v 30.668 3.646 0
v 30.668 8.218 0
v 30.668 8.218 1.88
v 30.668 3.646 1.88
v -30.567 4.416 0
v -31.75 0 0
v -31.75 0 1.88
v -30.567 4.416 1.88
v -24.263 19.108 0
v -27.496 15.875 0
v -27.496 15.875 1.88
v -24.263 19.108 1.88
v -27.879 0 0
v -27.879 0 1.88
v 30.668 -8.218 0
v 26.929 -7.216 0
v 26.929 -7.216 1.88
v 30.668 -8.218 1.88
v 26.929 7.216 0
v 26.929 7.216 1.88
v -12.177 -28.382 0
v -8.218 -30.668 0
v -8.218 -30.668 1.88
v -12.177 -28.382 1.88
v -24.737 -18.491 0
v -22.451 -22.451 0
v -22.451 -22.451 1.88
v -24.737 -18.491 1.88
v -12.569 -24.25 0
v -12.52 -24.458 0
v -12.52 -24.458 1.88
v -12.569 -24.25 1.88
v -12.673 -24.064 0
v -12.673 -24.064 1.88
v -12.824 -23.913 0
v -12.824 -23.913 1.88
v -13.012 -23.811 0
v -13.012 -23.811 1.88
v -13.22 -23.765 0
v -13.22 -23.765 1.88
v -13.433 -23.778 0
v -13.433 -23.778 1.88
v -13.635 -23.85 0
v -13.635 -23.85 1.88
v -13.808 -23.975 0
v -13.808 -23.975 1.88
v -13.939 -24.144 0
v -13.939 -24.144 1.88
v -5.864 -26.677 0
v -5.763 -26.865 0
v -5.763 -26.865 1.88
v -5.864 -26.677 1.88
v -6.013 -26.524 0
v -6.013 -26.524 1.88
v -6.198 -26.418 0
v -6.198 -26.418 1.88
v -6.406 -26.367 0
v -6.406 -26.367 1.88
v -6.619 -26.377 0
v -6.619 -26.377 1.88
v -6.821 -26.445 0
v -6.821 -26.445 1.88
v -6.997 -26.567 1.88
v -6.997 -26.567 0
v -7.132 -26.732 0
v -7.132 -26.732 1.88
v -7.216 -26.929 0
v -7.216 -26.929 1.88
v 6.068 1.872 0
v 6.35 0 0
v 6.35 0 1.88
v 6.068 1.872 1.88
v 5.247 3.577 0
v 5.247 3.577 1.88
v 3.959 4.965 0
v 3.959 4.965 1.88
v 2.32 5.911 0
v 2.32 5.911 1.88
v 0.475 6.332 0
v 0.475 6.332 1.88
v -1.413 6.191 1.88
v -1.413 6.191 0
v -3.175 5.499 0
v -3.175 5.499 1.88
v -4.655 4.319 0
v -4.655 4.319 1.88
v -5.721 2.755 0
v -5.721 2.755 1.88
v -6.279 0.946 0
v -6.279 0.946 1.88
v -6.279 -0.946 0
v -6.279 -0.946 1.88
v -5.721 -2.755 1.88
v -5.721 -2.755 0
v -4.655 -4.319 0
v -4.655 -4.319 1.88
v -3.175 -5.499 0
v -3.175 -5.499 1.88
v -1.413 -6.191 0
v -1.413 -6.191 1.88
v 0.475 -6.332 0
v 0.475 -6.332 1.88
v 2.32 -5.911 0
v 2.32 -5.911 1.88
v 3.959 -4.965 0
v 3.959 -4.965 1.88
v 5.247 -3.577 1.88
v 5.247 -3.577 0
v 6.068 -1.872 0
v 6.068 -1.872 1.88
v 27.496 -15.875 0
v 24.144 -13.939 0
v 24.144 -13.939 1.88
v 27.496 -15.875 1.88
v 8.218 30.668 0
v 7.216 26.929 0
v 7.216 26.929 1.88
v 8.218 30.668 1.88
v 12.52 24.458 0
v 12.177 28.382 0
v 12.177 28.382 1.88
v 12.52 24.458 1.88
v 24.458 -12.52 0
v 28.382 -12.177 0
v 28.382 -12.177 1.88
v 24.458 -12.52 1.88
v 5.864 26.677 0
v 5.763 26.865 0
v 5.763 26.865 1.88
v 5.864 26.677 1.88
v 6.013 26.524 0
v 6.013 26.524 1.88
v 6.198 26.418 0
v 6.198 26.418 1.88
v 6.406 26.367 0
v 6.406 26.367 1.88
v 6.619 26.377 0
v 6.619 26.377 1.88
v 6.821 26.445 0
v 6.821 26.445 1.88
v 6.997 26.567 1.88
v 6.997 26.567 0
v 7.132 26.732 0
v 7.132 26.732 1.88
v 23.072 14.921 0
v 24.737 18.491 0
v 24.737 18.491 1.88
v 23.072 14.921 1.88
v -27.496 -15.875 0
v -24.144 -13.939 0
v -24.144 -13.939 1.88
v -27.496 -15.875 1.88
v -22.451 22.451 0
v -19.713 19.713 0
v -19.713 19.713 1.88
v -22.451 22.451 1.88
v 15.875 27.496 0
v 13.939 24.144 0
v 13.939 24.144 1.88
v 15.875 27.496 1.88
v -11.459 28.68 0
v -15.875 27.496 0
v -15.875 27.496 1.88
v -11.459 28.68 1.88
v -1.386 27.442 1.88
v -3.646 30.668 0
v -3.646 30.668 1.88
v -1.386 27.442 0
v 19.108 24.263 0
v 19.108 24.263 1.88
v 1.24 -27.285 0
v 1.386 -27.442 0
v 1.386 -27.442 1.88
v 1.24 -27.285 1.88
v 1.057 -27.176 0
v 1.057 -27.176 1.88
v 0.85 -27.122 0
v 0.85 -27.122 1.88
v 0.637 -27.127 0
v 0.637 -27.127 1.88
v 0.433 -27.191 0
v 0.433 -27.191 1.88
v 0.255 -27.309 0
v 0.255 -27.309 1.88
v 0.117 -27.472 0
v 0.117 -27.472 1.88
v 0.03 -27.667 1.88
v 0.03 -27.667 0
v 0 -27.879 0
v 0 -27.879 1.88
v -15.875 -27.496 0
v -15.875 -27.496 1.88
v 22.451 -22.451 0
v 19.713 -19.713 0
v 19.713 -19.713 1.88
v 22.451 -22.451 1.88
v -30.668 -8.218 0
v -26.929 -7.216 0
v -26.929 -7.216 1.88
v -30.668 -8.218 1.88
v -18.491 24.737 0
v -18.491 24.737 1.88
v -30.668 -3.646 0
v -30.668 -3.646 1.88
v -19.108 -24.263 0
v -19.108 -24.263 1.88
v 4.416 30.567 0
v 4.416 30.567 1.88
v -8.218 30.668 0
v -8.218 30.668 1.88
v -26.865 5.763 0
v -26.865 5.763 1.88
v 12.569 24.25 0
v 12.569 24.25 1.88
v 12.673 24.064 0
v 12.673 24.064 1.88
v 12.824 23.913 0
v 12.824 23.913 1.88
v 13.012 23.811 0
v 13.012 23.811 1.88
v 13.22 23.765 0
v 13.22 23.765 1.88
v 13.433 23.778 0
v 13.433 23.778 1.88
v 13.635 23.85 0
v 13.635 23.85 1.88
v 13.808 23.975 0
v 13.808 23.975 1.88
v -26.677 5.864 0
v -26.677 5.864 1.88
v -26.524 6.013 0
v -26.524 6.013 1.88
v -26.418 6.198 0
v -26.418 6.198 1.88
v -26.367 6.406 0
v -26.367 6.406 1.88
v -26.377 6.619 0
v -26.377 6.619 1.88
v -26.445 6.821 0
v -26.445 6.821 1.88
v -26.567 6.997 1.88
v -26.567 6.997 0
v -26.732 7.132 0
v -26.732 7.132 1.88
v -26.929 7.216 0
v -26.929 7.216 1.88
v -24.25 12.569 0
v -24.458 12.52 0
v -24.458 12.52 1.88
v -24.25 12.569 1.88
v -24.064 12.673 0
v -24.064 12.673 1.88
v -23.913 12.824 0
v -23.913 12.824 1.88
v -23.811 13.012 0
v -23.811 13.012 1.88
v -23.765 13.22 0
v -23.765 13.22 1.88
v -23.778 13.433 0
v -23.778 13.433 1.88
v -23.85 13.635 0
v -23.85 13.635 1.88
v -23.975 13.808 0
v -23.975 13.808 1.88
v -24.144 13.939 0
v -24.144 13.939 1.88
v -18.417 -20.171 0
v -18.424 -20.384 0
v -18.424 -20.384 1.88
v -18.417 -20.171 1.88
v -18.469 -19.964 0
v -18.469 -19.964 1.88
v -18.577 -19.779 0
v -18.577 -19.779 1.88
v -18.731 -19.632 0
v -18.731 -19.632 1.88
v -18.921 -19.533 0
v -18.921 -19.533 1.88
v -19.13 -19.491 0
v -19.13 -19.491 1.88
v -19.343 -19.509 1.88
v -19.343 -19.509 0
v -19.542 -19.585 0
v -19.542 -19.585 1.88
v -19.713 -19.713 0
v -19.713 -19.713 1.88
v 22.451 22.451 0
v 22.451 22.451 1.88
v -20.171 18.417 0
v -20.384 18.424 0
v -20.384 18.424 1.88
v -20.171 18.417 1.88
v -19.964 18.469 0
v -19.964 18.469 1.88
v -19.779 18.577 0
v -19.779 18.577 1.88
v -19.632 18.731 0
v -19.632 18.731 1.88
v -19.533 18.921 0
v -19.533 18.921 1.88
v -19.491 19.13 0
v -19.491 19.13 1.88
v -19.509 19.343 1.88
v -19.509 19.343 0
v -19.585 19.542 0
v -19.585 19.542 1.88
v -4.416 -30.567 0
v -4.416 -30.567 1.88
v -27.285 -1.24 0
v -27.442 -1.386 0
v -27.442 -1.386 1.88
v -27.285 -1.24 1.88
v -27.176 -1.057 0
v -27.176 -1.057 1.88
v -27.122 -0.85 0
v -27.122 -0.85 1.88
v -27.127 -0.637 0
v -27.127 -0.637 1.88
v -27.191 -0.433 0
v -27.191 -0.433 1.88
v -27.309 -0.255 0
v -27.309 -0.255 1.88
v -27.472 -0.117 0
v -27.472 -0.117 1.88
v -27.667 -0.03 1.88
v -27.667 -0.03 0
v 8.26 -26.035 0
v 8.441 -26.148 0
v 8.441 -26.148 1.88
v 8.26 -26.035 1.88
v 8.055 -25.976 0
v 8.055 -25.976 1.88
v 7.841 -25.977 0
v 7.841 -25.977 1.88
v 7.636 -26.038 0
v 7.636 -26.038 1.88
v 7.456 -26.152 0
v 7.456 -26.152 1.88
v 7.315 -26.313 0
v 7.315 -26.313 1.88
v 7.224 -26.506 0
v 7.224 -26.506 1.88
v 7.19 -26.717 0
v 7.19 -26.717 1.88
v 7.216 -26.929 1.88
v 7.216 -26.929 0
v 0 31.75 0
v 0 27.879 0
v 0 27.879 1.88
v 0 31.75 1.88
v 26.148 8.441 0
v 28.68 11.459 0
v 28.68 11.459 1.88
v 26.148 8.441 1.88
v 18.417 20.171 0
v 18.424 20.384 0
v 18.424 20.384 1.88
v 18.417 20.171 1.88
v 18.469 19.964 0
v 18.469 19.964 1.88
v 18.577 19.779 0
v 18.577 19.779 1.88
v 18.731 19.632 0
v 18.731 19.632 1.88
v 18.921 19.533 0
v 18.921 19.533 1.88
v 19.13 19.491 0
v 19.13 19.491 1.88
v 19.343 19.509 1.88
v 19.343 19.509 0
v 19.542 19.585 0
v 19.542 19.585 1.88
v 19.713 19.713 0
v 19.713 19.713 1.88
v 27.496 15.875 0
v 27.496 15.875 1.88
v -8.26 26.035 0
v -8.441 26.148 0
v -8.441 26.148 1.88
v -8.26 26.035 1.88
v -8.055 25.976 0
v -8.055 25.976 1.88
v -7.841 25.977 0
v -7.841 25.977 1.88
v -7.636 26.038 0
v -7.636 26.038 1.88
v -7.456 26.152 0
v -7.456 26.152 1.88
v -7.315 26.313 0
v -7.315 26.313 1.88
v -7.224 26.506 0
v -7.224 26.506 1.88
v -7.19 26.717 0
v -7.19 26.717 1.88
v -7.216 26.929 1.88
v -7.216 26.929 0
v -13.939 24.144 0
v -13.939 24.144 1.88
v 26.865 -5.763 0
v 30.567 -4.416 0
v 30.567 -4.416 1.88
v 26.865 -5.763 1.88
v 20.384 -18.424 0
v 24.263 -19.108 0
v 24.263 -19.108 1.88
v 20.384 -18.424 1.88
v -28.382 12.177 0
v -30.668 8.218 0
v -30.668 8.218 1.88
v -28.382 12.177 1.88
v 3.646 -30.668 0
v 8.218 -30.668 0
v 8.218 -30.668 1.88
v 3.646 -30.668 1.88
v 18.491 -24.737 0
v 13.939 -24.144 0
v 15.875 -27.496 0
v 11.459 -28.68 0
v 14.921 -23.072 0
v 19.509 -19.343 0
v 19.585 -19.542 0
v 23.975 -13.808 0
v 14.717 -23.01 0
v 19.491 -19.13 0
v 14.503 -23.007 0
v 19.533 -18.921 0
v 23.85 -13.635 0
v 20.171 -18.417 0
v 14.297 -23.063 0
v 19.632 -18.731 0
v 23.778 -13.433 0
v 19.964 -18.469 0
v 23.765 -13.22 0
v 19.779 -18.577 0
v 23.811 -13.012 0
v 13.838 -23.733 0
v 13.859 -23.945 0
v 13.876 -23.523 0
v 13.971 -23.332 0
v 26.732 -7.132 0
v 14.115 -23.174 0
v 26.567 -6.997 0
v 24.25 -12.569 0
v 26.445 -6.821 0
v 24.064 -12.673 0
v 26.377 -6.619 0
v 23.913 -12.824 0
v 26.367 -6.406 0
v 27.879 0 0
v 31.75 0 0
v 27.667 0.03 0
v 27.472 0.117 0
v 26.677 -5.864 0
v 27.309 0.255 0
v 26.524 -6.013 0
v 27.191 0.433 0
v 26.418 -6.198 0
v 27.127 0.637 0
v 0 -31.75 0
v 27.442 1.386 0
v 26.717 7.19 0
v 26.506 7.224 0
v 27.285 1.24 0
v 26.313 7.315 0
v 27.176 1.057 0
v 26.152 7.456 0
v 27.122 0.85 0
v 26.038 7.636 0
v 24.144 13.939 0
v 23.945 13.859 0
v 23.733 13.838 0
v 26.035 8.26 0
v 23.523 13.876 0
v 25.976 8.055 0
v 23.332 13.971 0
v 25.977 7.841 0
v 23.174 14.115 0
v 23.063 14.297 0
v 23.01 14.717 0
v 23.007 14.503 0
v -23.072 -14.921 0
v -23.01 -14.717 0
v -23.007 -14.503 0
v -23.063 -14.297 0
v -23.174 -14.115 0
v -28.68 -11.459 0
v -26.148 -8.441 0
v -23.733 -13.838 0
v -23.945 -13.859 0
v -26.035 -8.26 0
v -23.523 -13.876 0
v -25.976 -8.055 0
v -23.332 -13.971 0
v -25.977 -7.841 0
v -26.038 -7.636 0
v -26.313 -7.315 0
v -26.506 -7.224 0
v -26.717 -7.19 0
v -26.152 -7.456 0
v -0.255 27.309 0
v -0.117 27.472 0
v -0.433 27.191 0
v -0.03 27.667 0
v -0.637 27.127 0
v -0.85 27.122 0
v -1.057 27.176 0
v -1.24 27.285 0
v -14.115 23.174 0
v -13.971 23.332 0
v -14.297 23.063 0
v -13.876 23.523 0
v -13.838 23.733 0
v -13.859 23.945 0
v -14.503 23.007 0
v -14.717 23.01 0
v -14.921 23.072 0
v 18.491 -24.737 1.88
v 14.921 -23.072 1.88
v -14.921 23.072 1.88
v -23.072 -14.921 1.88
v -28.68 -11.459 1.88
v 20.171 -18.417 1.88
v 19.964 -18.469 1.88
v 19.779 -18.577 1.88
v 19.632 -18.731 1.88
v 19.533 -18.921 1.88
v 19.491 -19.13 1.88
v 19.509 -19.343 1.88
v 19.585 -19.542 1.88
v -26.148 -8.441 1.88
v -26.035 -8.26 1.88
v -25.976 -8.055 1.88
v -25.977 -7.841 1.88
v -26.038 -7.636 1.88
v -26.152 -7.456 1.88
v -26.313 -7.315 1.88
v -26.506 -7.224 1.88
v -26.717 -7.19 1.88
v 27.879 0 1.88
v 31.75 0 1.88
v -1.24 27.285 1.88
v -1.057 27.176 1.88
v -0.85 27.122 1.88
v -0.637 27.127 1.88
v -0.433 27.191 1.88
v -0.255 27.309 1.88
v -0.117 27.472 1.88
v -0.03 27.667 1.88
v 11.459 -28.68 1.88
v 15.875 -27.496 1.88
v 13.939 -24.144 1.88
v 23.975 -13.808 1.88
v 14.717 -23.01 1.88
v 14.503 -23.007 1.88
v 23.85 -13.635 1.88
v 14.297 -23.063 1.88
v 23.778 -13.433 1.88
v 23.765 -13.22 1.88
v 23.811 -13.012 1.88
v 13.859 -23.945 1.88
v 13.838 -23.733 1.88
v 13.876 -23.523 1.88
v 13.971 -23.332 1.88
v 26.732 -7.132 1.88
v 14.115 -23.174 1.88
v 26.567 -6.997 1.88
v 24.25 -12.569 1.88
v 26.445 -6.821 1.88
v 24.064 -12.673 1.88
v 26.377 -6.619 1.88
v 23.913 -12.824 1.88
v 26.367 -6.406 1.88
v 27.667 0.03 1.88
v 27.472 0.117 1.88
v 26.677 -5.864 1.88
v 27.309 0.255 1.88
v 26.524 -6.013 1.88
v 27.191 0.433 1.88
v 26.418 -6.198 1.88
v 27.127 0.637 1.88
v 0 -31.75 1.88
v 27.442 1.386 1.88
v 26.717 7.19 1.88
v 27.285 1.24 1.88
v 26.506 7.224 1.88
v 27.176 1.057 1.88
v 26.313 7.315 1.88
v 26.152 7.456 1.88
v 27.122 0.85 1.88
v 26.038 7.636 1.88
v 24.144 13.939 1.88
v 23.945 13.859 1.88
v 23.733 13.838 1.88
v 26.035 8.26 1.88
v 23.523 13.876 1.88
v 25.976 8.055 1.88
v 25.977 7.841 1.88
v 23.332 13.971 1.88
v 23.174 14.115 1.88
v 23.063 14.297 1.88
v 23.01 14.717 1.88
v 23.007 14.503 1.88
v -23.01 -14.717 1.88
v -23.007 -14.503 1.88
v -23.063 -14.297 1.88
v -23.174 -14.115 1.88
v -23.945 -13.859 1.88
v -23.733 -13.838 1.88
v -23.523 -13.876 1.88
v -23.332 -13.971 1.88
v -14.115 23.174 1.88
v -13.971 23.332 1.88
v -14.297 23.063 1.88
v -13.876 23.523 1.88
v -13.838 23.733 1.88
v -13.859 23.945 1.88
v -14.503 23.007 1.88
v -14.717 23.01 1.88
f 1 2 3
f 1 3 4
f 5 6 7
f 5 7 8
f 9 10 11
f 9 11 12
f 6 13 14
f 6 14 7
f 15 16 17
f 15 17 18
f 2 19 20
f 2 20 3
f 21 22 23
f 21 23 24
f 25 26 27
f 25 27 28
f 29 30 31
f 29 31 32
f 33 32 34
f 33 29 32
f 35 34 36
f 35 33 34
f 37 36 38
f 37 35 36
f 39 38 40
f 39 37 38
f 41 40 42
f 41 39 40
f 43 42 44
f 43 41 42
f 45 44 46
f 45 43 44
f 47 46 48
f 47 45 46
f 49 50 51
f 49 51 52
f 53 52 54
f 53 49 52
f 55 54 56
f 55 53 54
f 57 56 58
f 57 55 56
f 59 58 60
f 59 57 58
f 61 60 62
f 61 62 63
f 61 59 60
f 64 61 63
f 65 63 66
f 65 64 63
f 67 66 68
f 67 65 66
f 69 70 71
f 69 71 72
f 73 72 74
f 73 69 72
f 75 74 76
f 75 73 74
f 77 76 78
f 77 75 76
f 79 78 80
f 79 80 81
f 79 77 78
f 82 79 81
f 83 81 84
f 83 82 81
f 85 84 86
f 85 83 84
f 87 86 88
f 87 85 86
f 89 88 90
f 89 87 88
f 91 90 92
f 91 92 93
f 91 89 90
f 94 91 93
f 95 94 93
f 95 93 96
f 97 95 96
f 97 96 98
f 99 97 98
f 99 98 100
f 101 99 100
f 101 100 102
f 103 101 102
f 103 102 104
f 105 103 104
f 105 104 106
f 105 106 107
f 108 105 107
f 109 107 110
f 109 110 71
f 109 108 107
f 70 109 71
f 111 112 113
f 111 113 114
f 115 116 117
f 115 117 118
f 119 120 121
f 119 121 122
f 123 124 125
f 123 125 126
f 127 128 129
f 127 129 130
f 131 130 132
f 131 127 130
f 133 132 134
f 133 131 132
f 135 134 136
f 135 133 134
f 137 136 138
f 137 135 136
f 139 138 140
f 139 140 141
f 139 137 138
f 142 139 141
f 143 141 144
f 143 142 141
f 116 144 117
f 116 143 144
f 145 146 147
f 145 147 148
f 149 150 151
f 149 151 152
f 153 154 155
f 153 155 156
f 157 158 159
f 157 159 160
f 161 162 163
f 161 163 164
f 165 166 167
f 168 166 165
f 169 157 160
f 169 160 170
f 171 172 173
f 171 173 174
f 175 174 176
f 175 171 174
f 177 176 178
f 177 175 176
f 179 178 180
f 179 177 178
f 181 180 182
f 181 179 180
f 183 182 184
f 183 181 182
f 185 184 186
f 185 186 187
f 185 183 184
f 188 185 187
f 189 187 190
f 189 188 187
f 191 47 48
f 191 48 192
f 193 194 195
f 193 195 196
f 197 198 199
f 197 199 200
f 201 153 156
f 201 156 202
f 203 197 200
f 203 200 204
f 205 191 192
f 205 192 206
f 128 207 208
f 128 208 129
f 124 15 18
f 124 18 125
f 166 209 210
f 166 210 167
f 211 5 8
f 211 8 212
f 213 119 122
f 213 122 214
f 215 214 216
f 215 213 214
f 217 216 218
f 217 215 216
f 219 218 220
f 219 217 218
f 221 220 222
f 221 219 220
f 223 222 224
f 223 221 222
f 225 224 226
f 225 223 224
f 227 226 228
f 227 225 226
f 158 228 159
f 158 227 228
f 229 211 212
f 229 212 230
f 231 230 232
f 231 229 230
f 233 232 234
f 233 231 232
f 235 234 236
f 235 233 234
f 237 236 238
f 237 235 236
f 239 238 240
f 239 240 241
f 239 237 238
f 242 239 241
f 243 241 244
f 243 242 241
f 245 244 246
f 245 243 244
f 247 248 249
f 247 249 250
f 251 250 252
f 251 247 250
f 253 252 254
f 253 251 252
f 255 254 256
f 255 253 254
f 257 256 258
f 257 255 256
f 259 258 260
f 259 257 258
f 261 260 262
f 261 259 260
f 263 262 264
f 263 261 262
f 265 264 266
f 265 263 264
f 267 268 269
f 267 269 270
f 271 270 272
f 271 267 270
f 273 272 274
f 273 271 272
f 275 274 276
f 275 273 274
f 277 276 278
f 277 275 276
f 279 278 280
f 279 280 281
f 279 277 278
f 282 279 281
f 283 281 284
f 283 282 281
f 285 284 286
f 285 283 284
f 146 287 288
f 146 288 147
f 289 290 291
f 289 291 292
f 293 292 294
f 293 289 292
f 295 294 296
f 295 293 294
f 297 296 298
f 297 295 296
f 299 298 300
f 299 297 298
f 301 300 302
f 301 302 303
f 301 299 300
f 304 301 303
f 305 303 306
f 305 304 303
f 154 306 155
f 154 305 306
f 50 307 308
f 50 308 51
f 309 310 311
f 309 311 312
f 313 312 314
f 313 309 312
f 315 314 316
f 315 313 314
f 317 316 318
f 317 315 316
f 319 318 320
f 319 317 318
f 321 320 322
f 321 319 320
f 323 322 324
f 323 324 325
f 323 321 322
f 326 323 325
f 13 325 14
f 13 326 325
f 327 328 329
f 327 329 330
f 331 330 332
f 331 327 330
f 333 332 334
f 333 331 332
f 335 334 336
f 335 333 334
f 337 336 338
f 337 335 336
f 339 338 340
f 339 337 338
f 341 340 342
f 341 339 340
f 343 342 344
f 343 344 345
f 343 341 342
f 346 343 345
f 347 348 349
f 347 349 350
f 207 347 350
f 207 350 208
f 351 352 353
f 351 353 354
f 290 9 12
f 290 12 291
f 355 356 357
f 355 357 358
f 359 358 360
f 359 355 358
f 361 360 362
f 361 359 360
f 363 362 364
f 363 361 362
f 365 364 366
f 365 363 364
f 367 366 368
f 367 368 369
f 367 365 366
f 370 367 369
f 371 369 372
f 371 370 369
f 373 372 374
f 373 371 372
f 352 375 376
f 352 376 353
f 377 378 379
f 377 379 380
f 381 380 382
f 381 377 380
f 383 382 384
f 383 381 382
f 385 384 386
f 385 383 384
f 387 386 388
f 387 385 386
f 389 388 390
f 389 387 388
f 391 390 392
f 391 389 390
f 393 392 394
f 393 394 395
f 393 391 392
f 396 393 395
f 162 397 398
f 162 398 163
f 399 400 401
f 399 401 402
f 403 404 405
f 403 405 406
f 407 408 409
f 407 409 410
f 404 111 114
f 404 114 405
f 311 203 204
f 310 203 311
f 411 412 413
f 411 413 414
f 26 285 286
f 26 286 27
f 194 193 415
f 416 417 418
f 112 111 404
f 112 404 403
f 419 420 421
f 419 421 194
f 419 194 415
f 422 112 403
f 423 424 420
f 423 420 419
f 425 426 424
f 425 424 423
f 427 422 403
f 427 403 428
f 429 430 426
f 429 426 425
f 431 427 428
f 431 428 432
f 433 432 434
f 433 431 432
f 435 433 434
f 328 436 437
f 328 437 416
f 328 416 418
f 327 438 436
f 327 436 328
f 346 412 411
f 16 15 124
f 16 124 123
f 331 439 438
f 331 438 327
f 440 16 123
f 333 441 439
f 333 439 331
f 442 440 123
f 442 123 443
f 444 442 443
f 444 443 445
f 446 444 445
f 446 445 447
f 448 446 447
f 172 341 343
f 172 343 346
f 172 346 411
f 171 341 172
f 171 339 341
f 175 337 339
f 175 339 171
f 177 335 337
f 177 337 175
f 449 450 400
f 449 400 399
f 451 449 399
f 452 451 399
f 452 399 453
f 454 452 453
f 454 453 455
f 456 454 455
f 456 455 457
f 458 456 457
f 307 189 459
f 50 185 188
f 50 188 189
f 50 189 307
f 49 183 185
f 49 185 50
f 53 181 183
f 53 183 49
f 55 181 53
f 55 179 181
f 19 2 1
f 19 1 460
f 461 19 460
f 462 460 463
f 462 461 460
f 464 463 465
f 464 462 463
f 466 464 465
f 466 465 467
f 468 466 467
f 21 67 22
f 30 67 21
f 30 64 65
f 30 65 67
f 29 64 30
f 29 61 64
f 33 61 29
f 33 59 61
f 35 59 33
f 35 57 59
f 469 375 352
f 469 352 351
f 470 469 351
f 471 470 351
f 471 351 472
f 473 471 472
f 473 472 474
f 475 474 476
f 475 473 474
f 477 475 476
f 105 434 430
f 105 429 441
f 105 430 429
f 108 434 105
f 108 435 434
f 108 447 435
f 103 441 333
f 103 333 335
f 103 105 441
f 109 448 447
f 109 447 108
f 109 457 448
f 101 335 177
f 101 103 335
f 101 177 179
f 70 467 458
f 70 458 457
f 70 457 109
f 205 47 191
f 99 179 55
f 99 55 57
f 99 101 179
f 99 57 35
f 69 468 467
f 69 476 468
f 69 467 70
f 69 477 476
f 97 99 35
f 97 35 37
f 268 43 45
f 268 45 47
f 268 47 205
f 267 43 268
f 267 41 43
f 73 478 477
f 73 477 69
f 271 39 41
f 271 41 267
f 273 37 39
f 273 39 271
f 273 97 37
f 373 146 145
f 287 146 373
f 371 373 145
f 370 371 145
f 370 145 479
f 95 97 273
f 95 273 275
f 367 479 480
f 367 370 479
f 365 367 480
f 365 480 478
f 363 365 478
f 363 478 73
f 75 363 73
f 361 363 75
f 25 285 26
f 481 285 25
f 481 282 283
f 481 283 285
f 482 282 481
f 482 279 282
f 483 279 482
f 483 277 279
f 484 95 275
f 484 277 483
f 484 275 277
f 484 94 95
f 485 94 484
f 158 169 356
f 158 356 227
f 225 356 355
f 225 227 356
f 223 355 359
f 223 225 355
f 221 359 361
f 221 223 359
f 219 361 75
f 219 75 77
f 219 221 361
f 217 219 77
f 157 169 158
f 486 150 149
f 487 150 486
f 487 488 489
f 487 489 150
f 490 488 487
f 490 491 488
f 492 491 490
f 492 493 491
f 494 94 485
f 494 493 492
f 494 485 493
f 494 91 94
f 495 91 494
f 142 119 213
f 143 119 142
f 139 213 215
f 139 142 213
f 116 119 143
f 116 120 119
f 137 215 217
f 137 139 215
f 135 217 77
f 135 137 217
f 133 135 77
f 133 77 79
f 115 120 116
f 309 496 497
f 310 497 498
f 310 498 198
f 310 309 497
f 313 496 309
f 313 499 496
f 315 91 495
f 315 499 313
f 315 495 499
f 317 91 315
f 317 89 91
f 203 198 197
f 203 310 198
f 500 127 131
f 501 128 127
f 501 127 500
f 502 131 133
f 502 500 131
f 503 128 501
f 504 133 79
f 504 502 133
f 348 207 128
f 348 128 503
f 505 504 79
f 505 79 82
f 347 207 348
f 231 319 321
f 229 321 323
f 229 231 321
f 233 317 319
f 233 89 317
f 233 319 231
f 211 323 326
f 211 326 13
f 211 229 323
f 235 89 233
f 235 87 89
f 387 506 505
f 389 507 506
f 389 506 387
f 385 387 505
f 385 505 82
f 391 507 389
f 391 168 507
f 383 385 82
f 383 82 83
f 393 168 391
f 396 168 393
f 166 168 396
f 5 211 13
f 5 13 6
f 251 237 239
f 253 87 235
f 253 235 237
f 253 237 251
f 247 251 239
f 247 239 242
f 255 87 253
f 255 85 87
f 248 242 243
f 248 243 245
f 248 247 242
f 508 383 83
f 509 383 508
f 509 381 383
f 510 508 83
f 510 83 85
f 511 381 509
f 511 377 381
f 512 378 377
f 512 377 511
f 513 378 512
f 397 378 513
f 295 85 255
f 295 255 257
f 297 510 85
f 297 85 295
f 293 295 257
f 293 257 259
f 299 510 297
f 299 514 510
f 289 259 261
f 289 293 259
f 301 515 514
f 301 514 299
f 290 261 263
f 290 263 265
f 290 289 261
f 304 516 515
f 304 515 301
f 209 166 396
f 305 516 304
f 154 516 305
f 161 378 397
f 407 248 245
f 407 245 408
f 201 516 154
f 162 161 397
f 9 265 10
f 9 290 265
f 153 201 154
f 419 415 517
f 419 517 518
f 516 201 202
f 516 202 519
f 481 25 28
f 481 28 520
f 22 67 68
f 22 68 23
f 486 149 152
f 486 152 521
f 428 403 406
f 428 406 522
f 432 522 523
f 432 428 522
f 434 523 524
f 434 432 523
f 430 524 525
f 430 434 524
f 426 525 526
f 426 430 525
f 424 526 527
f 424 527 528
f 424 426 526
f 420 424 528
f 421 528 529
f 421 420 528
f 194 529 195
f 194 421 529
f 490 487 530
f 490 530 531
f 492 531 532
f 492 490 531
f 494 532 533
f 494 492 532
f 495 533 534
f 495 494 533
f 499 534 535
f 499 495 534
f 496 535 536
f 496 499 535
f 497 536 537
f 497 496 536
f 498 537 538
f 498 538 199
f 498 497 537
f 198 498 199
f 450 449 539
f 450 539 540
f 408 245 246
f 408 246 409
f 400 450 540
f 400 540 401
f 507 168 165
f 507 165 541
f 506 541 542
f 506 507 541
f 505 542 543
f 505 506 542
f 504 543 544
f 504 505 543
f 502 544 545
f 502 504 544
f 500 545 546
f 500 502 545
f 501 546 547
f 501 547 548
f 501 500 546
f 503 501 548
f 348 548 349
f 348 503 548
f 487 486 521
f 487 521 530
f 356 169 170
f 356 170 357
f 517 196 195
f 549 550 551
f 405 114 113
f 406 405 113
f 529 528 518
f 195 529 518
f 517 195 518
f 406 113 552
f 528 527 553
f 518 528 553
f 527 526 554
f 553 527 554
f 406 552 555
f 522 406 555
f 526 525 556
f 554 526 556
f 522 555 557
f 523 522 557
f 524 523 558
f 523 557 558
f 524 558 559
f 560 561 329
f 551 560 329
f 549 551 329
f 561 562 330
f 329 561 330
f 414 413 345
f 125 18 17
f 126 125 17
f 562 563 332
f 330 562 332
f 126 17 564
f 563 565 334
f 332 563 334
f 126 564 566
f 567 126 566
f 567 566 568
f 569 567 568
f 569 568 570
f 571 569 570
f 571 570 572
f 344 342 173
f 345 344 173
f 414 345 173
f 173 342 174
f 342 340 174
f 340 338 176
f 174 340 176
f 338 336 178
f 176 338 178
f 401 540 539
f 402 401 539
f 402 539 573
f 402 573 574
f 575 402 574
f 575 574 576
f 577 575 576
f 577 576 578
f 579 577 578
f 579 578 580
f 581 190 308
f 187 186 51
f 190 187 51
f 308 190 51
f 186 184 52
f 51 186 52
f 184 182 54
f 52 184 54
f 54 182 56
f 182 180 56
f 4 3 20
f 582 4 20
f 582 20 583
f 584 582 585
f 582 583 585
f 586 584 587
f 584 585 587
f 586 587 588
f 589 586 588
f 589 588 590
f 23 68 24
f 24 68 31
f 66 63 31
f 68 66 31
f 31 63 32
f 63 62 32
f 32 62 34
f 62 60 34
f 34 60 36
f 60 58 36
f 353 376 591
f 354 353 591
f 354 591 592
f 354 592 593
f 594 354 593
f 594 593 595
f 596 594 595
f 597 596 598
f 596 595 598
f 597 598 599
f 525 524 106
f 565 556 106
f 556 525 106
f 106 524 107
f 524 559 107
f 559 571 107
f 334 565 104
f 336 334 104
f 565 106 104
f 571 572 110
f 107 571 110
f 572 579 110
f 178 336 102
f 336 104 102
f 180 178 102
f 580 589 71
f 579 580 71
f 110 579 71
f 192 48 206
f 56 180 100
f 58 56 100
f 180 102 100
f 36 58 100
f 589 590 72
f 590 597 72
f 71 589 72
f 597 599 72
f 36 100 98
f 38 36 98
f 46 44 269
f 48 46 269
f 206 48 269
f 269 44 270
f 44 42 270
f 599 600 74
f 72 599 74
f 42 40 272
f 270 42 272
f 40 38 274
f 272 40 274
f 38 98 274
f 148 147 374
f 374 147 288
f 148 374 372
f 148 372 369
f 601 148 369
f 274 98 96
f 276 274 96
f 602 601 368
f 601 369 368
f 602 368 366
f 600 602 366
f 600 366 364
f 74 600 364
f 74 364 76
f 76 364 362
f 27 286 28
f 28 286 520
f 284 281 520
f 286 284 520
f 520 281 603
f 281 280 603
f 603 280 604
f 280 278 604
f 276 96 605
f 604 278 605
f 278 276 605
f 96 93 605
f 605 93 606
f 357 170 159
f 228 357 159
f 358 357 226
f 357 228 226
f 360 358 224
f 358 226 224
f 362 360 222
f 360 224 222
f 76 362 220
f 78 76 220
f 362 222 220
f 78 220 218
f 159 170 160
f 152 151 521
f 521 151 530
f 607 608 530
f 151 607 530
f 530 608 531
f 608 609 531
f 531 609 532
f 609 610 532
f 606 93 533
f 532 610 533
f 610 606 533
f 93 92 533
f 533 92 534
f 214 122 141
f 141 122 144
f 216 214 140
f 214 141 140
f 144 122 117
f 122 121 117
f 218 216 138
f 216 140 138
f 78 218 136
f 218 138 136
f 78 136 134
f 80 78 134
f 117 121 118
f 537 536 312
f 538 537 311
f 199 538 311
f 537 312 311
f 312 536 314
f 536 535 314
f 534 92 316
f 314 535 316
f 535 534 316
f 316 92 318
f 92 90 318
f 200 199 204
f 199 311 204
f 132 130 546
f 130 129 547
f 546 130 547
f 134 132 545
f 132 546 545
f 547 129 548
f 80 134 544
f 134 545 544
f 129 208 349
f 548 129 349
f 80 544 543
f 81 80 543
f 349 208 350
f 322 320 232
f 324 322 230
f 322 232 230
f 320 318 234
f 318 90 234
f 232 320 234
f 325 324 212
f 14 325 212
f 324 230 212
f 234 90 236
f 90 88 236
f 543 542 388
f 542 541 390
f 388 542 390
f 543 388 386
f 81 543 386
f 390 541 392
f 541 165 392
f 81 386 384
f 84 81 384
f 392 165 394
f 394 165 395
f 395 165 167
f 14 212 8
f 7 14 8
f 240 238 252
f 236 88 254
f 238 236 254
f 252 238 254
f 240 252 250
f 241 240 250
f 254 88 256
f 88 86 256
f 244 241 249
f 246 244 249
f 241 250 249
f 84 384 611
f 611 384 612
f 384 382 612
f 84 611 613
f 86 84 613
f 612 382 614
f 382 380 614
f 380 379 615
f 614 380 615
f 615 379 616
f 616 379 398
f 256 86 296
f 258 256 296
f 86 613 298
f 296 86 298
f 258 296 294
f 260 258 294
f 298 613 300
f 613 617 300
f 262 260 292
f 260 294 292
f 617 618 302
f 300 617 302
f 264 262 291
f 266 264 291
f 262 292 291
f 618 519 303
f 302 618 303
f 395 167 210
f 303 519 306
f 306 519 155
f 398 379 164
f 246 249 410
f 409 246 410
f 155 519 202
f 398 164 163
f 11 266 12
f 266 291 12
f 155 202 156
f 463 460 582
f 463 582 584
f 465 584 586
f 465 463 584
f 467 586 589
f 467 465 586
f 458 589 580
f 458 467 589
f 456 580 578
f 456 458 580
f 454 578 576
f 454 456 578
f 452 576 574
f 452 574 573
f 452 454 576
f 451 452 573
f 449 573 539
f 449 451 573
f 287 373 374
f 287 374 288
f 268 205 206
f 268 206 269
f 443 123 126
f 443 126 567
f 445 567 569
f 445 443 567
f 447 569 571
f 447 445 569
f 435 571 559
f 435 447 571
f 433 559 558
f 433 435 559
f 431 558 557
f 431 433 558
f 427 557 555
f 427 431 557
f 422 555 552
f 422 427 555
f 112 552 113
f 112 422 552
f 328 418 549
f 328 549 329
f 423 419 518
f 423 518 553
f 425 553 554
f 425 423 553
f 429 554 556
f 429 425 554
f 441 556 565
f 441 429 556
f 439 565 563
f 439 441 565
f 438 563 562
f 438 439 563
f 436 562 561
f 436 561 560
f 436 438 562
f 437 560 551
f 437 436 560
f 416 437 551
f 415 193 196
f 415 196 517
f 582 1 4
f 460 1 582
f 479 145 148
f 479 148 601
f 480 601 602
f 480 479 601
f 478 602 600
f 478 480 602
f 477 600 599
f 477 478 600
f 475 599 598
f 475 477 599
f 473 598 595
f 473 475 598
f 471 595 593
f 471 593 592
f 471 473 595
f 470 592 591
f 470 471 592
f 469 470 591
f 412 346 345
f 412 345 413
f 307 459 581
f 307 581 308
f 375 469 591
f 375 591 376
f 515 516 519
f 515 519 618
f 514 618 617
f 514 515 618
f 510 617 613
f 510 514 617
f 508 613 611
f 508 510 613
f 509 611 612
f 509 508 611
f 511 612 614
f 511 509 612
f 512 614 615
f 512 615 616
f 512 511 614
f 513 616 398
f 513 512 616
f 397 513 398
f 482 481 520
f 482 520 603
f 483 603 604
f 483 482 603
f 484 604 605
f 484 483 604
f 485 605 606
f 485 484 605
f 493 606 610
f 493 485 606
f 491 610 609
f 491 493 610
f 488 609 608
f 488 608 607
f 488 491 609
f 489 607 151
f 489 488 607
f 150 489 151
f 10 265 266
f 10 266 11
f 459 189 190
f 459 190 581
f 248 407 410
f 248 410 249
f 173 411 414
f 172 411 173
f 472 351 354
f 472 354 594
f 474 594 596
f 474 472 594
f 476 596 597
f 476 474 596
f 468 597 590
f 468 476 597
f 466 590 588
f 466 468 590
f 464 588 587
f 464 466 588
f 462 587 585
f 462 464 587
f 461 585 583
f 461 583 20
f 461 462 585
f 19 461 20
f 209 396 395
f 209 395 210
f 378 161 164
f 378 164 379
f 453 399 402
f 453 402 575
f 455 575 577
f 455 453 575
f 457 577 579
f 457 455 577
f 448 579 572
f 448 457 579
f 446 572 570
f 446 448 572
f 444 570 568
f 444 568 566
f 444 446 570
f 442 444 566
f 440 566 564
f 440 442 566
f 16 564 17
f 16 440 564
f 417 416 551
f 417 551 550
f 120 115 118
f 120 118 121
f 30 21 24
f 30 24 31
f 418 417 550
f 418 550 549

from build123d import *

# Parameters (mm, degrees)
SKETCH1_R           = 6.35
BOSS_EXTRUDE1_DEPTH = 1.8796


with BuildPart() as part:
    # Sketch1 → Boss-Extrude1 (new body)
    with BuildSketch(Plane.XY):
        with BuildLine():
            Line((0, 31.75), (4.416212878, 30.566679326))
            Line((4.416212878, 30.566679326), (5.763426192, 26.865241165))
            ThreePointArc((5.763426192, 26.865241165), (6.512709942, 26.364585769), (7.215507449, 26.928640402))
            Line((7.215507449, 26.928640402), (8.217504682, 30.668144985))
            Line((8.217504682, 30.668144985), (12.176972828, 28.382144985))
            Line((12.176972828, 28.382144985), (12.520278272, 24.458145807))
            ThreePointArc((12.520278272, 24.458145807), (13.114451646, 23.780620926), (13.939289989, 24.143558483))
            Line((13.939289989, 24.143558483), (15.875, 27.49630657))
            Line((15.875, 27.49630657), (19.107892204, 24.263414367))
            Line((19.107892204, 24.263414367), (18.423894078, 20.384268232))
            ThreePointArc((18.423894078, 20.384268232), (18.822465142, 19.576046065), (19.713132953, 19.713132953))
            Line((19.713132953, 19.713132953), (22.450640303, 22.450640303))
            Line((22.450640303, 22.450640303), (24.736640303, 18.491172157))
            Line((24.736640303, 18.491172157), (23.071951949, 14.921236463))
            ThreePointArc((23.071951949, 14.921236463), (23.247758745, 14.037396016), (24.143558483, 13.939289989))
            Line((24.143558483, 13.939289989), (27.49630657, 15.875))
            Line((27.49630657, 15.875), (28.679627244, 11.458787122))
            Line((28.679627244, 11.458787122), (26.147694424, 8.441347087))
            ThreePointArc((26.147694424, 8.441347087), (26.088756008, 7.542120627), (26.928640402, 7.215507449))
            Line((26.928640402, 7.215507449), (30.668144985, 8.217504682))
            Line((30.668144985, 8.217504682), (30.668144985, 3.645504682))
            Line((30.668144985, 3.645504682), (27.441514734, 1.386193858))
            ThreePointArc((27.441514734, 1.386193858), (27.151847662, 0.532862181), (27.878579979, 0))
            Line((27.878579979, 0), (31.75, 0))
            Line((31.75, 0), (30.566679326, -4.416212878))
            Line((30.566679326, -4.416212878), (26.865241165, -5.763426192))
            ThreePointArc((26.865241165, -5.763426192), (26.364585769, -6.512709942), (26.928640402, -7.215507449))
            Line((26.928640402, -7.215507449), (30.668144985, -8.217504682))
            Line((30.668144985, -8.217504682), (28.382144985, -12.176972828))
            Line((28.382144985, -12.176972828), (24.458145807, -12.520278272))
            ThreePointArc((24.458145807, -12.520278272), (23.780620926, -13.114451646), (24.143558483, -13.939289989))
            Line((24.143558483, -13.939289989), (27.49630657, -15.875))
            Line((27.49630657, -15.875), (24.263414367, -19.107892204))
            Line((24.263414367, -19.107892204), (20.384268232, -18.423894078))
            ThreePointArc((20.384268232, -18.423894078), (19.576046065, -18.822465142), (19.713132953, -19.713132953))
            Line((19.713132953, -19.713132953), (22.450640303, -22.450640303))
            Line((22.450640303, -22.450640303), (18.491172157, -24.736640303))
            Line((18.491172157, -24.736640303), (14.921236463, -23.071951949))
            ThreePointArc((14.921236463, -23.071951949), (14.037396016, -23.247758745), (13.939289989, -24.143558483))
            Line((13.939289989, -24.143558483), (15.875, -27.49630657))
            Line((15.875, -27.49630657), (11.458787122, -28.679627244))
            Line((11.458787122, -28.679627244), (8.441347087, -26.147694424))
            ThreePointArc((8.441347087, -26.147694424), (7.542120627, -26.088756008), (7.215507449, -26.928640402))
            Line((7.215507449, -26.928640402), (8.217504682, -30.668144985))
            Line((8.217504682, -30.668144985), (3.645504682, -30.668144985))
            Line((3.645504682, -30.668144985), (1.386193858, -27.441514734))
            ThreePointArc((1.386193858, -27.441514734), (0.532862181, -27.151847662), (0, -27.878579979))
            Line((0, -27.878579979), (0, -31.75))
            Line((0, -31.75), (-4.416212878, -30.566679326))
            Line((-4.416212878, -30.566679326), (-5.763426192, -26.865241165))
            ThreePointArc((-5.763426192, -26.865241165), (-6.512709942, -26.364585769), (-7.215507449, -26.928640402))
            Line((-7.215507449, -26.928640402), (-8.217504682, -30.668144985))
            Line((-8.217504682, -30.668144985), (-12.176972828, -28.382144985))
            Line((-12.176972828, -28.382144985), (-12.520278272, -24.458145807))
            ThreePointArc((-12.520278272, -24.458145807), (-13.114451646, -23.780620926), (-13.939289989, -24.143558483))
            Line((-13.939289989, -24.143558483), (-15.875, -27.49630657))
            Line((-15.875, -27.49630657), (-19.107892204, -24.263414367))
            Line((-19.107892204, -24.263414367), (-18.423894078, -20.384268232))
            ThreePointArc((-18.423894078, -20.384268232), (-18.822465142, -19.576046065), (-19.713132953, -19.713132953))
            Line((-19.713132953, -19.713132953), (-22.450640303, -22.450640303))
            Line((-22.450640303, -22.450640303), (-24.736640303, -18.491172157))
            Line((-24.736640303, -18.491172157), (-23.071951949, -14.921236463))
            ThreePointArc((-23.071951949, -14.921236463), (-23.247758745, -14.037396016), (-24.143558483, -13.939289989))
            Line((-24.143558483, -13.939289989), (-27.49630657, -15.875))
            Line((-27.49630657, -15.875), (-28.679627244, -11.458787122))
            Line((-28.679627244, -11.458787122), (-26.147694424, -8.441347087))
            ThreePointArc((-26.147694424, -8.441347087), (-26.088756008, -7.542120627), (-26.928640402, -7.215507449))
            Line((-26.928640402, -7.215507449), (-30.668144985, -8.217504682))
            Line((-30.668144985, -8.217504682), (-30.668144985, -3.645504682))
            Line((-30.668144985, -3.645504682), (-27.441514734, -1.386193858))
            ThreePointArc((-27.441514734, -1.386193858), (-27.151847662, -0.532862181), (-27.878579979, 0))
            Line((-27.878579979, 0), (-31.75, 0))
            Line((-31.75, 0), (-30.566679326, 4.416212878))
            Line((-30.566679326, 4.416212878), (-26.865241165, 5.763426192))
            ThreePointArc((-26.865241165, 5.763426192), (-26.364585769, 6.512709942), (-26.928640402, 7.215507449))
            Line((-26.928640402, 7.215507449), (-30.668144985, 8.217504682))
            Line((-30.668144985, 8.217504682), (-28.382144985, 12.176972828))
            Line((-28.382144985, 12.176972828), (-24.458145807, 12.520278272))
            ThreePointArc((-24.458145807, 12.520278272), (-23.780620926, 13.114451646), (-24.143558483, 13.939289989))
            Line((-24.143558483, 13.939289989), (-27.49630657, 15.875))
            Line((-27.49630657, 15.875), (-24.263414367, 19.107892204))
            Line((-24.263414367, 19.107892204), (-20.384268232, 18.423894078))
            ThreePointArc((-20.384268232, 18.423894078), (-19.576046065, 18.822465142), (-19.713132953, 19.713132953))
            Line((-19.713132953, 19.713132953), (-22.450640303, 22.450640303))
            Line((-22.450640303, 22.450640303), (-18.491172157, 24.736640303))
            Line((-18.491172157, 24.736640303), (-14.921236463, 23.071951949))
            ThreePointArc((-14.921236463, 23.071951949), (-14.037396016, 23.247758745), (-13.939289989, 24.143558483))
            Line((-13.939289989, 24.143558483), (-15.875, 27.49630657))
            Line((-15.875, 27.49630657), (-11.458787122, 28.679627244))
            Line((-11.458787122, 28.679627244), (-8.441347087, 26.147694424))
            ThreePointArc((-8.441347087, 26.147694424), (-7.542120627, 26.088756008), (-7.215507449, 26.928640402))
            Line((-7.215507449, 26.928640402), (-8.217504682, 30.668144985))
            Line((-8.217504682, 30.668144985), (-3.645504682, 30.668144985))
            Line((-3.645504682, 30.668144985), (-1.386193858, 27.441514734))
            ThreePointArc((-1.386193858, 27.441514734), (-0.532862181, 27.151847662), (0, 27.878579979))
            Line((0, 27.878579979), (0, 31.75))
        make_face()
        Circle(SKETCH1_R, mode=Mode.SUBTRACT)
    extrude(amount=BOSS_EXTRUDE1_DEPTH)


solid = part.part
